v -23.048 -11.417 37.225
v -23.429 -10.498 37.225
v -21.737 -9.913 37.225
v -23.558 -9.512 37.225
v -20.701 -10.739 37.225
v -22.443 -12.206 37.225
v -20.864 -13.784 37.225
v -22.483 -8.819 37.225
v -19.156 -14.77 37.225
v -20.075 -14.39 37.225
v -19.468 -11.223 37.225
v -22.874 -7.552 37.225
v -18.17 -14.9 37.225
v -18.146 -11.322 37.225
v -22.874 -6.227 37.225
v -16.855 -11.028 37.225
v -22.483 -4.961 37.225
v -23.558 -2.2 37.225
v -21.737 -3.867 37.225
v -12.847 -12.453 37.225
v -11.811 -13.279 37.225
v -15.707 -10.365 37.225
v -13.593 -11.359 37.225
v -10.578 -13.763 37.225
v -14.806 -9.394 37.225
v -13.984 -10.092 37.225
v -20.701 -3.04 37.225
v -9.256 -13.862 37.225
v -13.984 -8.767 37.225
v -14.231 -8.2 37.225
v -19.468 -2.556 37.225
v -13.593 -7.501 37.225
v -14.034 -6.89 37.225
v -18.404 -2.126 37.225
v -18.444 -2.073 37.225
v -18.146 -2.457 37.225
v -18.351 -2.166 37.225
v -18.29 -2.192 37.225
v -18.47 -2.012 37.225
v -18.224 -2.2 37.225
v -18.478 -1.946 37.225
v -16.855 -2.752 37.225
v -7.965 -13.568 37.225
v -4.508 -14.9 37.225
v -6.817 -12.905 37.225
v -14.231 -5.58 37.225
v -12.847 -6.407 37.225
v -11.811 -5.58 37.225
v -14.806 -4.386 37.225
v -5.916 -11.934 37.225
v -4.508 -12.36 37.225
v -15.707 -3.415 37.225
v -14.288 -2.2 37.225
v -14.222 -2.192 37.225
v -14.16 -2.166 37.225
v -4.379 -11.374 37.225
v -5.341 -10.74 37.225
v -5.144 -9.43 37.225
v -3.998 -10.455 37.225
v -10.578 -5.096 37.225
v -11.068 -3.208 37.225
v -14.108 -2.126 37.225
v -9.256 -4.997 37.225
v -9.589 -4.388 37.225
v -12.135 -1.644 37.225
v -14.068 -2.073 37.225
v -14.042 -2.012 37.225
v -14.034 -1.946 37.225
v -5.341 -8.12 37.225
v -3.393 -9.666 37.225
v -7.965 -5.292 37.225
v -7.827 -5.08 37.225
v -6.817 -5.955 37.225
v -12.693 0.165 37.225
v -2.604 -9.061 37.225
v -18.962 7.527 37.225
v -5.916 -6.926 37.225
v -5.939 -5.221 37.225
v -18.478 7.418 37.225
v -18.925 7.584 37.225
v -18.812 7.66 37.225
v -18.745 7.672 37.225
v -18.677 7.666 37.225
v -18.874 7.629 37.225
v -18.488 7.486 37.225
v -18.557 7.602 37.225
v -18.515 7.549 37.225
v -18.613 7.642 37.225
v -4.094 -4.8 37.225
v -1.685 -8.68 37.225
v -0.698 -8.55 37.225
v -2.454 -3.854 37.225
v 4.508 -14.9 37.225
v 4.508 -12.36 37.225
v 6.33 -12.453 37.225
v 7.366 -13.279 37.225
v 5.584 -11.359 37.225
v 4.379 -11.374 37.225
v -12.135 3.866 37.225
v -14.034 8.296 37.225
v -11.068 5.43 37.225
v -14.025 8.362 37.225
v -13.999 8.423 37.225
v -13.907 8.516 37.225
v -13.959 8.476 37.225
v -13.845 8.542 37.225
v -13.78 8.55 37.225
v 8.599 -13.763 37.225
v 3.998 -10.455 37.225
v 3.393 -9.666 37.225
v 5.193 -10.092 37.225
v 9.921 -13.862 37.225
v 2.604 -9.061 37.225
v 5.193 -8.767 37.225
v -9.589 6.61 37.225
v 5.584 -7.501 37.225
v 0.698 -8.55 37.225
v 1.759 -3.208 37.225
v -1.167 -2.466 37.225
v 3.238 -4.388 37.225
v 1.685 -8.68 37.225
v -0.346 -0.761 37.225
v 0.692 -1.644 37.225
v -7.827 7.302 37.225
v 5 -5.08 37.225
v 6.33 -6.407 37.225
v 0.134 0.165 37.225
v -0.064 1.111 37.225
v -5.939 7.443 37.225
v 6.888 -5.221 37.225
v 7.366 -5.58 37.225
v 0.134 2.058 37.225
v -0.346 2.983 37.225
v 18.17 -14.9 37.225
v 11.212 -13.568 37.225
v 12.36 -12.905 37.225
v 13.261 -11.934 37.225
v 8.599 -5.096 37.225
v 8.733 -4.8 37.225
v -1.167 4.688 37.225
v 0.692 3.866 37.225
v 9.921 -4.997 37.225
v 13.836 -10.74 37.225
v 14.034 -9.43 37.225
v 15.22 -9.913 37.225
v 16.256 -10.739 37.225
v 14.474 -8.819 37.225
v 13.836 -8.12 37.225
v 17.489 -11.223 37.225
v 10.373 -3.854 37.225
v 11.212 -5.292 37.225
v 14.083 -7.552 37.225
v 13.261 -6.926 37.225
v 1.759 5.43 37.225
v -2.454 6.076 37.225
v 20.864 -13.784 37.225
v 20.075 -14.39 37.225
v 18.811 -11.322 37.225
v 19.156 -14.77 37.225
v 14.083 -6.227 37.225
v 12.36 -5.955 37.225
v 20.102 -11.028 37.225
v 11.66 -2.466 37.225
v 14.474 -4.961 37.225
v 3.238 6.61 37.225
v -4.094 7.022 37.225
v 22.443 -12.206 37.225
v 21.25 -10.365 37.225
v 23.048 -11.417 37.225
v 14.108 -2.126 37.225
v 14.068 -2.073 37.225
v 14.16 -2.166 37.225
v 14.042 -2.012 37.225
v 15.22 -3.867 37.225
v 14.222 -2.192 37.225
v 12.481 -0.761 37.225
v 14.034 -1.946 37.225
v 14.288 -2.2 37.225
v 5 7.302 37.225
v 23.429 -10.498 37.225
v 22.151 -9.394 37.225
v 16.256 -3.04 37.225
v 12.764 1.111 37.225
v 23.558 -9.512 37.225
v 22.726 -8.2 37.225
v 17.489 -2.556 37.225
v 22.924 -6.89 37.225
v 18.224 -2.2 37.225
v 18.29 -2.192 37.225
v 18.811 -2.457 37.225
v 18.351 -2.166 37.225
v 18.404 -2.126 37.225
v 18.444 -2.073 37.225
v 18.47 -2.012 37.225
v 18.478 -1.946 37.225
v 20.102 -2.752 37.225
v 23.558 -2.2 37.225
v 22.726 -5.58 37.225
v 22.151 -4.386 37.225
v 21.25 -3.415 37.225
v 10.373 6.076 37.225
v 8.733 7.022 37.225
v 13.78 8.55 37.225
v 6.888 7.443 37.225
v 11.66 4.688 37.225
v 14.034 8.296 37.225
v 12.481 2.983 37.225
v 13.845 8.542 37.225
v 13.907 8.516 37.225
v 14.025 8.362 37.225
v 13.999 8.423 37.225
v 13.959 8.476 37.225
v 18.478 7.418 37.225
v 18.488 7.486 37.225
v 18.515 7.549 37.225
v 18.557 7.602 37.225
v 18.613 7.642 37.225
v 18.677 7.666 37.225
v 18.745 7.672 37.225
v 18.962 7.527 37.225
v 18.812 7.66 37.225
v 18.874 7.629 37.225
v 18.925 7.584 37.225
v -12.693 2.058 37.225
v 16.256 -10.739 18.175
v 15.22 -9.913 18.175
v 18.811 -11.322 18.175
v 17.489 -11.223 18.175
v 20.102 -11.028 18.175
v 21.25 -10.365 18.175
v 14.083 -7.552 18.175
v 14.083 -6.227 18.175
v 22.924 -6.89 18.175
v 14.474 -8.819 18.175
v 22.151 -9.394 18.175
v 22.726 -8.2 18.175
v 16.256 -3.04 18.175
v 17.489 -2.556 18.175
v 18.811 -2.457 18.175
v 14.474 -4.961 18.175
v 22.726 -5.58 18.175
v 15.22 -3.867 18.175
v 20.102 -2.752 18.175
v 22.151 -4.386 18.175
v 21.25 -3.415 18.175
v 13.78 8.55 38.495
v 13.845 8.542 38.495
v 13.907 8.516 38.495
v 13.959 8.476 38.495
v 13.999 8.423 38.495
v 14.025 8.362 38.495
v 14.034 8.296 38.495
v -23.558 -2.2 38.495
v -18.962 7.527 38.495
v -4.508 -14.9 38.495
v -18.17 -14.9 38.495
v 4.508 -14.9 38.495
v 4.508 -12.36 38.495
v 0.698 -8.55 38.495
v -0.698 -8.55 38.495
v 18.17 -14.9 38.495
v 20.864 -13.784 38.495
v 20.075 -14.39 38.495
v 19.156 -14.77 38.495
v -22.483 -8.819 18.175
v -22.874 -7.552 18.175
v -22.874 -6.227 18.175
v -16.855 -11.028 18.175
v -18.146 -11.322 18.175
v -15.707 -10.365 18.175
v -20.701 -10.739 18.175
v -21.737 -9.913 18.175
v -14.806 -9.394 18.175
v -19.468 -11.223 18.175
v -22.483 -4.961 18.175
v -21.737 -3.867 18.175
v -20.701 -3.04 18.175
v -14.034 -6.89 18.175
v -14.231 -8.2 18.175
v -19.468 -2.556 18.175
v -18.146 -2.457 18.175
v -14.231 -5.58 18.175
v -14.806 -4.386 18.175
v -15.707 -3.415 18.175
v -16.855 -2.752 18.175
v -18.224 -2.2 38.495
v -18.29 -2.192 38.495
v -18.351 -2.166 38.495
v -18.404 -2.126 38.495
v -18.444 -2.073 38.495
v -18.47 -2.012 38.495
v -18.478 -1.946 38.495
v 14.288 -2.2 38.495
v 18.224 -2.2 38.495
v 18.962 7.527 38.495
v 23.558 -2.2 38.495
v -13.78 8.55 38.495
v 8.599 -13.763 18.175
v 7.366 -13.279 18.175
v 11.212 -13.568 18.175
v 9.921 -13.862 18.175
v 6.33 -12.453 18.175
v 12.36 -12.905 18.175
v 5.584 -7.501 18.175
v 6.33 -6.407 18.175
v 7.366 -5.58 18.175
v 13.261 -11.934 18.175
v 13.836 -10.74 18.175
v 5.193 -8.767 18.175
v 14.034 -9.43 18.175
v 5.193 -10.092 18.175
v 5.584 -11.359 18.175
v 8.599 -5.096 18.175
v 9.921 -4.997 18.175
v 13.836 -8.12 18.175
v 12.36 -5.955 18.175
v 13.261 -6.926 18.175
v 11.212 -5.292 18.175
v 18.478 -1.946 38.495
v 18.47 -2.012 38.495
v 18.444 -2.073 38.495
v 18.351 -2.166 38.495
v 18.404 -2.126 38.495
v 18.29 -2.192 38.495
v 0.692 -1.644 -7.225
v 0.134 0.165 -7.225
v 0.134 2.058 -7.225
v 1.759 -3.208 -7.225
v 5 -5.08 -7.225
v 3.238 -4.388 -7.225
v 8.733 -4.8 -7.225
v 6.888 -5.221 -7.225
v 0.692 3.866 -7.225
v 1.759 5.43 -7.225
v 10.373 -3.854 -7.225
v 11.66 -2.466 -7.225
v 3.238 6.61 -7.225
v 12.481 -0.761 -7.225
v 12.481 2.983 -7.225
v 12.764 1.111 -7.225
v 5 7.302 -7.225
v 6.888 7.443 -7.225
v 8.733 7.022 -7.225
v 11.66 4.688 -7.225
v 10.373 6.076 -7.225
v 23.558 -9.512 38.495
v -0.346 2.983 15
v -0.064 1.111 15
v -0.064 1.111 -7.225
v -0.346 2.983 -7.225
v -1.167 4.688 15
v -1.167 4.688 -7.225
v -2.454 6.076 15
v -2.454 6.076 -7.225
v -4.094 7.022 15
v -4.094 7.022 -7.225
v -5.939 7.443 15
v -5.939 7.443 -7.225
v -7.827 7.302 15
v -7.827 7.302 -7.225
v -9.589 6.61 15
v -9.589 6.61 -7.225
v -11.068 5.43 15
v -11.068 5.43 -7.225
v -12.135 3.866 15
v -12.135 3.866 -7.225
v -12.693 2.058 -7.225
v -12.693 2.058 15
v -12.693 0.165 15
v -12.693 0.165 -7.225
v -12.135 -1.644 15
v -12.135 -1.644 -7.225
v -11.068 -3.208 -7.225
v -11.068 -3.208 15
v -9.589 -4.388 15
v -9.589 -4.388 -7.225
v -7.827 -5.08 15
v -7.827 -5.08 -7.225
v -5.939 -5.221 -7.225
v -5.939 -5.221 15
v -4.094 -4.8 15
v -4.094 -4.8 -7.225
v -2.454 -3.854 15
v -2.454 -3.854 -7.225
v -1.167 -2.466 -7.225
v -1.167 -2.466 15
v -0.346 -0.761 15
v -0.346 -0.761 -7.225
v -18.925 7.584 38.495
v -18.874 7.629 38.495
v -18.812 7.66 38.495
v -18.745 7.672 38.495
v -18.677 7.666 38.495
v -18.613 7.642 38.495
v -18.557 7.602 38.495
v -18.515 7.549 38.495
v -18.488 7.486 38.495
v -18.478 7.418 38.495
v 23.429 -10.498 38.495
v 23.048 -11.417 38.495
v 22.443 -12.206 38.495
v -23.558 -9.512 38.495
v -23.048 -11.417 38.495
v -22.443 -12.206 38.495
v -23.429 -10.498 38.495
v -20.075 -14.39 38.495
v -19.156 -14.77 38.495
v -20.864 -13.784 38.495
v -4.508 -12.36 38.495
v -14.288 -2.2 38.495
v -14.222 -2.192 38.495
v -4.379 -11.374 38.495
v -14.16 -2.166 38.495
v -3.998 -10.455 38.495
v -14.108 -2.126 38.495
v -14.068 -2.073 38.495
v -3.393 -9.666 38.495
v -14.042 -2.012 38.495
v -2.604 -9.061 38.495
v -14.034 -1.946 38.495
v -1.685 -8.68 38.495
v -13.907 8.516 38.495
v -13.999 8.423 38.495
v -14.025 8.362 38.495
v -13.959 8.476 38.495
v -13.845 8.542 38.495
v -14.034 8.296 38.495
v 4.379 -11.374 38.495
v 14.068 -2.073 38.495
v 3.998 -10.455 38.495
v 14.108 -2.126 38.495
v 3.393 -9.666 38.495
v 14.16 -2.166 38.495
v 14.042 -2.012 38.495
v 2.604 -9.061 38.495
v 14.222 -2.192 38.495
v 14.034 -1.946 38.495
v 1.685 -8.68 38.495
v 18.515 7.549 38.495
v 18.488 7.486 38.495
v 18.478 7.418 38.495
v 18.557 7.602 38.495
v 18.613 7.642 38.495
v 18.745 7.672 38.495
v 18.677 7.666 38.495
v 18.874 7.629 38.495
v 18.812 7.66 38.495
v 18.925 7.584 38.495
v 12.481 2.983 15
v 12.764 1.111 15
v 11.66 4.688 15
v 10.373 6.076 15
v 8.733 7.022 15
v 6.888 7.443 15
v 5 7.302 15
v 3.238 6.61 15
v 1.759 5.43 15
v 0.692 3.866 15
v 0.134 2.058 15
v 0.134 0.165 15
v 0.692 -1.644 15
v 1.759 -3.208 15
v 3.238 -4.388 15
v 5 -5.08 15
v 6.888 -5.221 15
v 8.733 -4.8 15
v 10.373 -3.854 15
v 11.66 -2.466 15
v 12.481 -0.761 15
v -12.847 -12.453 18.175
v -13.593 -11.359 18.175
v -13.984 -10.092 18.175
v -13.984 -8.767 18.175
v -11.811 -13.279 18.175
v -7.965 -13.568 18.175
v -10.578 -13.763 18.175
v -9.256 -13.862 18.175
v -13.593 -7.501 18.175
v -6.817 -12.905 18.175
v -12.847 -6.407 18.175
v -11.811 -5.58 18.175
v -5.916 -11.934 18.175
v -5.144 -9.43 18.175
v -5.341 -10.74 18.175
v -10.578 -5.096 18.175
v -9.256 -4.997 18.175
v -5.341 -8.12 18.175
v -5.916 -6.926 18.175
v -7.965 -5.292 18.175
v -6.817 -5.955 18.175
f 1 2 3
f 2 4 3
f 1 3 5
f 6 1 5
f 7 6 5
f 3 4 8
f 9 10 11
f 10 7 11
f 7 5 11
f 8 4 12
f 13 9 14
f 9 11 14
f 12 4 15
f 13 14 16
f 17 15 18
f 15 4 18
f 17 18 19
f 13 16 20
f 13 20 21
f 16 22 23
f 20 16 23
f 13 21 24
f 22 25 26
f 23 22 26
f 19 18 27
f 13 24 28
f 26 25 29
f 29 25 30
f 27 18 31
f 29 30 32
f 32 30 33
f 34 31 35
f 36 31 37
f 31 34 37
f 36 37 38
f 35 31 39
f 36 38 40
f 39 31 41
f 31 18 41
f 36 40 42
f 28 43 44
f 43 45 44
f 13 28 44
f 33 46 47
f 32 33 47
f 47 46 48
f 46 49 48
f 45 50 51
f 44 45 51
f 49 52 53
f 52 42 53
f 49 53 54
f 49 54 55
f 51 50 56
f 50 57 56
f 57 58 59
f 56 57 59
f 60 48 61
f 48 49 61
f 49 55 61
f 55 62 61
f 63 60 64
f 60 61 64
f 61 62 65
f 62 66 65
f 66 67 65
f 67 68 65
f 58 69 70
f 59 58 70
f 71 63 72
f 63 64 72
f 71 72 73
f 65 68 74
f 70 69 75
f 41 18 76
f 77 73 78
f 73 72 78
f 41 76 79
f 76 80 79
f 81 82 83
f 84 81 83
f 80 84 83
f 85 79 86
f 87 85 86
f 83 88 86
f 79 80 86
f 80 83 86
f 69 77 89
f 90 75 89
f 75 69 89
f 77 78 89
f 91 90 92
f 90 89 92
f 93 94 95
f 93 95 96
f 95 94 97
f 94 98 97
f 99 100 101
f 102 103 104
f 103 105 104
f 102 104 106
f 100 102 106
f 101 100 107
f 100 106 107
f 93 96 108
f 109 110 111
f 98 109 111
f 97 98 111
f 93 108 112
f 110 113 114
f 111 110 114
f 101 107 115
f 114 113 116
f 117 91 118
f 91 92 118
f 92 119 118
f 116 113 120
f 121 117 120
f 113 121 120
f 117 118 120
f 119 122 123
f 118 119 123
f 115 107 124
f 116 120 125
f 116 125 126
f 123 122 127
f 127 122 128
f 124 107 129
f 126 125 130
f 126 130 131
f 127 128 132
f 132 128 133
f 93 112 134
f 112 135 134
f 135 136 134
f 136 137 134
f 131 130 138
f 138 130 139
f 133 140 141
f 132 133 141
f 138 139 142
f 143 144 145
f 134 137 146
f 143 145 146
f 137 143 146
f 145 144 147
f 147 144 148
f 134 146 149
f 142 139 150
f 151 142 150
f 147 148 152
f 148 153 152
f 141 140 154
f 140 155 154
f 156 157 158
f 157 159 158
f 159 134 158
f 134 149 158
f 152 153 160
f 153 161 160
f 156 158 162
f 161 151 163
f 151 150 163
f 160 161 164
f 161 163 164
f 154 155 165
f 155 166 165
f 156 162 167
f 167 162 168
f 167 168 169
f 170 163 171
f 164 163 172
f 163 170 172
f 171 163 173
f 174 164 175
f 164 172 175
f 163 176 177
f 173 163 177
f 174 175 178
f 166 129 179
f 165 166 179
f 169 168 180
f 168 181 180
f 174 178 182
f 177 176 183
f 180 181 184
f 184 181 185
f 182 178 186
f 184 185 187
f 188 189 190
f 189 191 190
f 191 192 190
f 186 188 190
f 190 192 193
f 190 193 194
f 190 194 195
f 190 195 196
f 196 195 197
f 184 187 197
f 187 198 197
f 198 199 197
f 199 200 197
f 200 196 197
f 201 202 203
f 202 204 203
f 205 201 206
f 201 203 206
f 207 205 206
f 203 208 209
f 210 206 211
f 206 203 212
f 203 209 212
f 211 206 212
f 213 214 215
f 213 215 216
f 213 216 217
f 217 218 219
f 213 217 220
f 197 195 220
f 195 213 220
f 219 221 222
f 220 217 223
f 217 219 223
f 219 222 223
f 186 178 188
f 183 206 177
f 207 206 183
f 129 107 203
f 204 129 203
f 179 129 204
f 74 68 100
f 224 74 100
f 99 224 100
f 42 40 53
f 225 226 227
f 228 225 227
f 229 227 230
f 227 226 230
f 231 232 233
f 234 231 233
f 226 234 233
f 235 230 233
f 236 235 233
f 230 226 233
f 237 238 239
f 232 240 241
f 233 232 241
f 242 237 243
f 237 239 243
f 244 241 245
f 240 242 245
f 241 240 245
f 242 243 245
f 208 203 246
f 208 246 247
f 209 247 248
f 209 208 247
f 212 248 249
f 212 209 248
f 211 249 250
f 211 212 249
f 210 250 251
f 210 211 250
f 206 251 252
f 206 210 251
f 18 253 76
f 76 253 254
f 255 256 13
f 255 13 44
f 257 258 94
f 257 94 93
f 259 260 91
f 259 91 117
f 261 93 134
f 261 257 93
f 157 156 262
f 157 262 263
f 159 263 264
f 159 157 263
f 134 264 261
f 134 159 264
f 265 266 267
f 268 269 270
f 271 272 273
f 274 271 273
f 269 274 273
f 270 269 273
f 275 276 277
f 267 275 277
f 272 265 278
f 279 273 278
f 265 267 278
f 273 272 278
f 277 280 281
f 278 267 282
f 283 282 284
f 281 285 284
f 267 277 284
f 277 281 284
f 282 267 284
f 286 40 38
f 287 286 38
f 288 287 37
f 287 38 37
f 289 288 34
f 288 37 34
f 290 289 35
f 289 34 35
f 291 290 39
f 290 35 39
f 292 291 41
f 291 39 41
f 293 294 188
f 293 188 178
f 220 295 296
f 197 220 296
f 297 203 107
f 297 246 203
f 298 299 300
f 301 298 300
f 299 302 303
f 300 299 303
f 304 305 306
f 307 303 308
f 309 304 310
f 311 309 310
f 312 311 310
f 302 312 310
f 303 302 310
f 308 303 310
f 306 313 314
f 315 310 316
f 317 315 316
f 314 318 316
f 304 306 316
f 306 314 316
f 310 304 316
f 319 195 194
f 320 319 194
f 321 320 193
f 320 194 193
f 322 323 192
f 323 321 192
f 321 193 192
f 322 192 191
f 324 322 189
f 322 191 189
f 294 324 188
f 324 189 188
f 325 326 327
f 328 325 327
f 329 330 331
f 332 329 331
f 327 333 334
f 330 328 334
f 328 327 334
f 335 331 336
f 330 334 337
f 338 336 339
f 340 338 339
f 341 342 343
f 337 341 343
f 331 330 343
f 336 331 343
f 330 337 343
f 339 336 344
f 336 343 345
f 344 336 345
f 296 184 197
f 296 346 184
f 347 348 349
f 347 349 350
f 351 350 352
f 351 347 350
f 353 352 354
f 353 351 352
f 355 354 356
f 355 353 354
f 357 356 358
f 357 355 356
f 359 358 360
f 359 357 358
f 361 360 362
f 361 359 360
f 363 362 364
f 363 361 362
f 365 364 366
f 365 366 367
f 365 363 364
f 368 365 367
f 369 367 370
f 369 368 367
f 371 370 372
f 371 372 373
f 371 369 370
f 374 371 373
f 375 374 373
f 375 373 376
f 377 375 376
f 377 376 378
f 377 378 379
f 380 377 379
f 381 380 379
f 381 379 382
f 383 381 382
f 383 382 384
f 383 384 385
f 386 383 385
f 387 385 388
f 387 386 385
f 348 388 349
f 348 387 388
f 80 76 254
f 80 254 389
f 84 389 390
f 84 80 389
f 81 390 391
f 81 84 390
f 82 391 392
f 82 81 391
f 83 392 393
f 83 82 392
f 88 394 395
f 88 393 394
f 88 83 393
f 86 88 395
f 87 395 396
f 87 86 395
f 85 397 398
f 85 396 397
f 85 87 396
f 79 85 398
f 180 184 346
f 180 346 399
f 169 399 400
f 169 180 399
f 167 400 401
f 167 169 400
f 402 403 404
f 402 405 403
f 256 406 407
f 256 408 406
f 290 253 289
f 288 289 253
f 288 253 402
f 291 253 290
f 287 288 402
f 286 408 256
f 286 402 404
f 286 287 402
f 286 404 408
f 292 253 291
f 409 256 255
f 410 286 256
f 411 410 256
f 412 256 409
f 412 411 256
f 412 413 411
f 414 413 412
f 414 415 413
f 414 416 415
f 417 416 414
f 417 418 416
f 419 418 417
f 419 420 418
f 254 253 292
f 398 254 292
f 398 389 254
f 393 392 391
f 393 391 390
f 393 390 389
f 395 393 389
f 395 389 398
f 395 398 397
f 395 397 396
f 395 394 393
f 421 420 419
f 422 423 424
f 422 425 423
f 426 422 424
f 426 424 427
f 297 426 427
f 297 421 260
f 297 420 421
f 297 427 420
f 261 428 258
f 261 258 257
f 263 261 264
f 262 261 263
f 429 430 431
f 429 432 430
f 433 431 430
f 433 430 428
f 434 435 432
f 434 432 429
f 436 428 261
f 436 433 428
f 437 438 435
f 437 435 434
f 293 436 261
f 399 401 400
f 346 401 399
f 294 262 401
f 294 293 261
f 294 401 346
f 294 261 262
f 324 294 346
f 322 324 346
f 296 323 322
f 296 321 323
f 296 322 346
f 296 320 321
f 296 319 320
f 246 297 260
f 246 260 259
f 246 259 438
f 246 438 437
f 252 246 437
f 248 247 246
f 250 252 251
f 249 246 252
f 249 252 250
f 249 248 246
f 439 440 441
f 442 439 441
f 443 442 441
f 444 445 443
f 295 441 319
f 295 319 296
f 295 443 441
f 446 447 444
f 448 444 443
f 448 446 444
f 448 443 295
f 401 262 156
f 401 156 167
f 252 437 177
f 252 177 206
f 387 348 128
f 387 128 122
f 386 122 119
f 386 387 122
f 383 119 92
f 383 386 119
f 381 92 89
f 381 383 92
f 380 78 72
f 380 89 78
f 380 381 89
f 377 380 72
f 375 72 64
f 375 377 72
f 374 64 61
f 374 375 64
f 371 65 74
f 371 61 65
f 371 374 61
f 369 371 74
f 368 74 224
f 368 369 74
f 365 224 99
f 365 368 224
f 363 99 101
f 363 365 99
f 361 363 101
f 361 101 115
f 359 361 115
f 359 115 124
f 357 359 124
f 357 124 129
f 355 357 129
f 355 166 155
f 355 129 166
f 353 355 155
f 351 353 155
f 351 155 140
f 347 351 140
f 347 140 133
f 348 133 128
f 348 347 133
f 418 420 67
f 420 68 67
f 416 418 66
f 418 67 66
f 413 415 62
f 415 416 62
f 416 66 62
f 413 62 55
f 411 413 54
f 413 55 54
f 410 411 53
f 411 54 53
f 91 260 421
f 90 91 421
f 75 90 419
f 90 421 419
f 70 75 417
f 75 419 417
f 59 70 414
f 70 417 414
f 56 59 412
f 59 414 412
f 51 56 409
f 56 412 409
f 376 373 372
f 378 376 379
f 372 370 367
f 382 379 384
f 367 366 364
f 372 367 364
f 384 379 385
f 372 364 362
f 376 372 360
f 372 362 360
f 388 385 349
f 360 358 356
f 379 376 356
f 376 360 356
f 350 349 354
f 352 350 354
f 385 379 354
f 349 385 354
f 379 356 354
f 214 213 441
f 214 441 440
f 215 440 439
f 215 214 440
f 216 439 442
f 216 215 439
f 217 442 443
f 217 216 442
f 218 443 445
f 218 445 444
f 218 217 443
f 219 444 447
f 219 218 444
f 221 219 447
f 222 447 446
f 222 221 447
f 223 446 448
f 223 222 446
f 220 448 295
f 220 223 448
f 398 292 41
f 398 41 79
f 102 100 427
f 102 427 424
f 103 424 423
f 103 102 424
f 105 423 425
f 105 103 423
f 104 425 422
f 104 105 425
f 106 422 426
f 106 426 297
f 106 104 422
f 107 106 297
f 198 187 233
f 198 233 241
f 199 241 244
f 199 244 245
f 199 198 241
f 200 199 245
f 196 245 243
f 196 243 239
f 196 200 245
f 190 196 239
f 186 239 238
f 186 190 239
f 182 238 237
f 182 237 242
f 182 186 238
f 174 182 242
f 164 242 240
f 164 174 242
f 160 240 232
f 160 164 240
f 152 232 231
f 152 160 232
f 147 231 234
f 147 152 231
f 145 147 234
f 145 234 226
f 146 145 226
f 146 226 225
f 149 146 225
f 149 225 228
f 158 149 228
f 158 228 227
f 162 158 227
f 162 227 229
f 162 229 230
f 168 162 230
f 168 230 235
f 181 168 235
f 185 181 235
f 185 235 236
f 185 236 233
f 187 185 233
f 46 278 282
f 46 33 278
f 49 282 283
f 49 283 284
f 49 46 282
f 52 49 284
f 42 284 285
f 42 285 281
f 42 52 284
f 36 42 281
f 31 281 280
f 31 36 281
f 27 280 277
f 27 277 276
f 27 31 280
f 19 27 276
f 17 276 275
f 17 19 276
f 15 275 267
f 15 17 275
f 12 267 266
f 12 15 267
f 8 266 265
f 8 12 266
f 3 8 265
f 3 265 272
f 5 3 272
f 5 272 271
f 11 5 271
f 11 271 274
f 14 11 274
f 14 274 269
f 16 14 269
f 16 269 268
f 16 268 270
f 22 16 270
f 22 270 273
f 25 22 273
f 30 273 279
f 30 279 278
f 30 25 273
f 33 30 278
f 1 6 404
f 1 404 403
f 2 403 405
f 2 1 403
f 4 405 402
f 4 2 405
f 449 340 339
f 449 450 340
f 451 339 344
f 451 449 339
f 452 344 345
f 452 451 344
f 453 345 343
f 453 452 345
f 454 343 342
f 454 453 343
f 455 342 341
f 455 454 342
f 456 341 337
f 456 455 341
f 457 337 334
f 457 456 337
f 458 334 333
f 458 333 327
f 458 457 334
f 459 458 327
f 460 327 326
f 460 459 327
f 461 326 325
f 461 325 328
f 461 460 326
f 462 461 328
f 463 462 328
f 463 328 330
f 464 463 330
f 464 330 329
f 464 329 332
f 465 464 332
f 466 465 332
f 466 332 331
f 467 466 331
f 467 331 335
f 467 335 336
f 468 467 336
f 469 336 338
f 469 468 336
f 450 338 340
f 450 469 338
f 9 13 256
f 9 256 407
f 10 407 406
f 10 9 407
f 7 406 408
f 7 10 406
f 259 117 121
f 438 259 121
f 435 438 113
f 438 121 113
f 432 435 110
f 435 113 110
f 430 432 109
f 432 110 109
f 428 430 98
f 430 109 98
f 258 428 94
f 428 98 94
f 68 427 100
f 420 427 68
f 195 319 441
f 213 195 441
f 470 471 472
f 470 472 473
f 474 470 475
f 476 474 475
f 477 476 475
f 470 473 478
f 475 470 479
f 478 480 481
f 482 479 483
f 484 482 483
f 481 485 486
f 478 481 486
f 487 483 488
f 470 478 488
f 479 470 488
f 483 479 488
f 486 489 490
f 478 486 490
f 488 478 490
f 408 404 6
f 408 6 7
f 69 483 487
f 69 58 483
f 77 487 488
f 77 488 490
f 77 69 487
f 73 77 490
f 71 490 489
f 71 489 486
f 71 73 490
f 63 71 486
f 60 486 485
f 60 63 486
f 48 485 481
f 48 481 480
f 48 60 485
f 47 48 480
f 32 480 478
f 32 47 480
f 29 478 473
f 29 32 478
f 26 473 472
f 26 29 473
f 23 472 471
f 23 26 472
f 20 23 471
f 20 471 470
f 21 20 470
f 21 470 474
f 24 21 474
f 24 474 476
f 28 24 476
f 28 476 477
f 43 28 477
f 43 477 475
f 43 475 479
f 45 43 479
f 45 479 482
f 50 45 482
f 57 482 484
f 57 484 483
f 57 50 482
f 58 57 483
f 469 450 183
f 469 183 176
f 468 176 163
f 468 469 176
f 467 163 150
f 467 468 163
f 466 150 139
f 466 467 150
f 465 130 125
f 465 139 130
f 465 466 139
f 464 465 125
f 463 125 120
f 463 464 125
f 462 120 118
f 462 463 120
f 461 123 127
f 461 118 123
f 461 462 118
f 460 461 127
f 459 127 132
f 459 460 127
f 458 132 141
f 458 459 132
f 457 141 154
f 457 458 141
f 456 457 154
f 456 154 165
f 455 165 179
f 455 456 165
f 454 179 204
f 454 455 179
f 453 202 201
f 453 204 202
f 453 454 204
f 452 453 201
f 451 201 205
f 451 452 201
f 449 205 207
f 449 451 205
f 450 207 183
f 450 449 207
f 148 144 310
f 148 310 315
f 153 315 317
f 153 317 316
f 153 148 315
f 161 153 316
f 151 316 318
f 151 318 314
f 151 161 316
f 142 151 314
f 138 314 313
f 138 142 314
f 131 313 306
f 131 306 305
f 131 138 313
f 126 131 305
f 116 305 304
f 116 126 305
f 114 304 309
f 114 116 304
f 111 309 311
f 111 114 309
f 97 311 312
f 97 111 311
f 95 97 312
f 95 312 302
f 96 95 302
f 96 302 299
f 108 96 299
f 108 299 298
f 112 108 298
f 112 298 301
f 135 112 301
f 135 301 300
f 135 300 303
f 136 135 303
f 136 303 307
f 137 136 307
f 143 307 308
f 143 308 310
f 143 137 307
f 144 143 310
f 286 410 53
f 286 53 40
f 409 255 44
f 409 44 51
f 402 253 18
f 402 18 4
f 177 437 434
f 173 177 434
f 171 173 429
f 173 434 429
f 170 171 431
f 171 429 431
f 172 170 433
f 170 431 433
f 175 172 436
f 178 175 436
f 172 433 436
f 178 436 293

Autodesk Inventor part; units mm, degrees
ref_plane "YZ Plane" through (0, 0, 0) normal (1, 0, 0) x (0, 1, 0)
ref_plane "XZ Plane" through (0, 0, 0) normal (0, 1, 0) x (-1, 0, 0)
ref_plane "XY Plane" through (0, 0, 0) normal (0, 0, 1) x (1, 0, 0)
sketch "Sketch1" plane through (-4.5, -9.15, 9.417) normal (0, -1, 0) x (1, 0, 0)
  point P0 (4.5, -9.417)
sketch "Sketch2" plane through (1.8079, 5.5858, 15) normal (0, 0, 1) x (1, 0, 0)
  line L0 (-1.8079, -5.5858) -> (-1.8079, -0.7733)
  circle A0 centre (-8.2214, -4.4747) radius 6.35
  circle A1 centre (4.6056, -4.4747) radius 6.35
  dimension "d0" = 12.7
  dimension "d1" = 6.4135
  dimension "d2" = 12.7
  dimension "d3" = 6.4135
extrude "Extrusion1" add sketch "Sketch2" along normal mid plane 44.45
sketch "Sketch4" plane through (6.4135, 1.1111, 37.225) normal (0, 0, 1) x (1, 0, 0)
  circle A0 centre (3.175, -10.541) radius 4.445
  circle A1 centre (0, 0) radius 6.35 projected
  point P0 (-6.4135, -1.1111)
  dimension "d7" = 8.89
  dimension "d8" = 10.541
  dimension "d9" = 3.175
sketch "Sketch5" plane through (-6.4135, 1.1111, 37.225) normal (0, 0, 1) x (1, 0, 0)
  circle A0 centre (-3.175, -10.541) radius 4.445
  circle A1 centre (0, 0) radius 6.35 projected
  point P0 (6.4135, -1.1111)
  dimension "d10" = 8.89
  dimension "d11" = 3.175
  dimension "d12" = 10.541
extrude "Extrusion2" add sketch "Sketch4" against normal blind 19.05 contours A0
extrude "Extrusion3" add sketch "Sketch5" against normal blind 19.05 contours A0
sketch "Sketch6" plane through (-9.5885, -9.4299, 37.225) normal (0, 0, 1) x (1, 0, 0)
  circle A0 centre (-8.89, 2.54) radius 4.445
  circle A1 centre (0, 0) radius 4.445 projected
  line L0 (0, 0) -> (0, 2.54)
  point P0 (9.5885, 9.4299)
  dimension "d17" = 8.89
  dimension "d18" = 8.89
  dimension "d52" = 2.54
  dimension "d53" = 0
extrude "Extrusion4" add sketch "Sketch6" against normal blind 19.05 contours A0
sketch "Sketch7" plane through (9.5885, -9.4299, 37.225) normal (0, 0, 1) x (1, 0, 0)
  circle A0 centre (8.89, 2.54) radius 4.445
  circle A1 centre (0, 0) radius 4.445 projected
  line L0 (0, 0) -> (0, 2.54)
  point P0 (-9.5885, 9.4299)
  dimension "d22" = 8.89
  dimension "d54" = 2.54
  dimension "d55" = 0
extrude "Extrusion5" add sketch "Sketch7" against normal blind 19.05 contours A0
sketch "Sketch8" plane through (6.4135, 1.1111, 37.225) normal (0, 0, 1) x (1, 0, 0)
  line L0 (-7.62, -6.7786) -> (7.62, -6.7786)
  line L1 (7.62, -6.7786) -> (7.62, 7.1914)
  line L2 (7.62, 7.1914) -> (-7.62, 7.1914)
  line L3 (-7.62, 7.1914) -> (-7.62, -6.7786)
  line L4 (-7.62, -6.7786) -> (7.62, 7.1914) construction
  line L5 (7.62, -6.7786) -> (-7.62, 7.1914) construction
  point P0 (-6.4135, -1.1111)
  point P1 (0, 0.2064)
  dimension "d27" = 15.24
  dimension "d28" = 13.97
sketch "Sketch9" plane through (-6.4135, 1.1111, 37.225) normal (0, 0, 1) x (1, 0, 0)
  line L0 (-7.62, -6.7768) -> (7.62, -6.7768)
  line L1 (7.62, -6.7768) -> (7.62, 7.1932)
  line L2 (7.62, 7.1932) -> (-7.62, 7.1932)
  line L3 (-7.62, 7.1932) -> (-7.62, -6.7768)
  line L4 (-7.62, -6.7768) -> (7.62, 7.1932) construction
  line L5 (7.62, -6.7768) -> (-7.62, 7.1932) construction
  point P0 (6.4135, -1.1111)
  point P1 (0, 0.2082)
  dimension "d29" = 15.24
  dimension "d30" = 13.97
extrude "Extrusion6" add sketch "Sketch9" along normal blind 1.27
extrude "Extrusion7" add sketch "Sketch8" along normal blind 1.27
sketch "Sketch10" plane through (-6.4135, 1.1111, 38.495) normal (0, 0, 1) x (1, 0, 0)
  line L0 (-7.62, -9.6614) -> (20.447, -9.6614)
  line L1 (20.447, -9.6614) -> (20.447, 7.4393)
  line L2 (20.447, 7.4393) -> (-7.62, 7.4393)
  line L3 (-7.62, 7.4393) -> (-7.62, -9.6614)
  line L4 (-7.62, -9.6614) -> (20.447, 7.4393) construction
  line L5 (20.447, -9.6614) -> (-7.62, 7.4393) construction
  point P0 (6.4135, -1.1111)
extrude "Extrusion8" add sketch "Sketch10" against normal blind 1.27
sketch "Sketch11" plane through (-6.4135, 1.1111, 38.495) normal (0, 0, 1) x (1, 0, 0)
  line L0 (-17.145, -16.0114) -> (1.905, -16.0114)
  line L1 (1.905, -16.0114) -> (1.905, -3.3114)
  line L2 (1.905, -3.3114) -> (-17.145, -3.3114)
  line L3 (-17.145, -3.3114) -> (-17.145, -16.0114)
  line L4 (-7.62, -9.6614) -> (-7.62, 7.4393) projected
  line L5 (-17.145, -16.0114) -> (1.905, -3.3114) construction
  line L6 (1.905, -16.0114) -> (-17.145, -3.3114) construction
  line L7 (10.922, -16.0114) -> (29.972, -16.0114)
  line L8 (29.972, -16.0114) -> (29.972, -3.3114)
  line L9 (29.972, -3.3114) -> (10.922, -3.3114)
  line L10 (10.922, -3.3114) -> (10.922, -16.0114)
  line L11 (20.447, -9.6614) -> (20.447, 7.4393) projected
  line L12 (10.922, -16.0114) -> (29.972, -3.3114) construction
  line L13 (29.972, -16.0114) -> (10.922, -3.3114) construction
  line L14 (-12.065, -3.3114) -> (-12.065, 7.4393)
  line L15 (24.892, -3.3114) -> (24.892, 7.4393)
  line L16 (24.892, 7.4393) -> (29.972, -3.3114)
  line L17 (-17.145, -3.3114) -> (-12.065, 7.4393)
  point P0 (6.4135, -1.1111)
  dimension "d37" = 19.05
  dimension "d38" = 12.7
  dimension "d39" = 19.05
  dimension "d40" = 12.7
  dimension "d41" = 5.08
  dimension "d42" = 5.08
extrude "Extrusion9" add sketch "Sketch11" against normal blind 1.27
fillet "Fillet1" radius 0.254 2 edges at (-18.4785, 8.5503, 37.86) (18.4785, 8.5503, 37.86)
fillet "Fillet2" radius 0.254 6 edges at (-14.0335, 8.5503, 37.86) (-18.4785, -2.2003, 37.86) (-14.0335, -2.2003, 37.86) (14.0335, -2.2003, 37.86) (18.4785, -2.2003, 37.86) (14.0335, 8.5503, 37.86)
fillet "Fillet3" radius 3.81 4 edges at (-23.5585, -14.9003, 37.86) (23.5585, -14.9003, 37.86) (-4.5085, -8.5503, 37.86) (4.5085, -8.5503, 37.86)
sketch "Sketch13" plane through (-6.4135, 1.1111, 38.495) normal (0, 0, 1) x (1, 0, 0)
  point P0 (6.4135, -1.1111)
sketch "Sketch14" plane through (-6.4135, 1.1111, 38.495) normal (0, 0, 1) x (1, 0, 0)
  arc A0 (-17.145, -12.2014) -> (-13.335, -16.0114) centre (-13.335, -12.2014) ccw projected
  line L0 (-17.145, -12.2014) -> (-13.335, -16.0114)
  line L1 (-13.335, -16.0114) -> (-15.2586, -17.935)
  line L2 (-15.2586, -17.935) -> (-19.0686, -14.125)
  line L3 (-19.0686, -14.125) -> (-17.145, -12.2014)
  arc A1 (26.162, -16.0114) -> (29.972, -12.2014) centre (26.162, -12.2014) ccw projected
  line L4 (26.162, -16.0114) -> (29.972, -12.2014)
  line L5 (29.972, -12.2014) -> (31.5861, -13.8155)
  line L6 (31.5861, -13.8155) -> (27.7761, -17.6255)
  line L7 (27.7761, -17.6255) -> (26.162, -16.0114)
  point P0 (6.4135, -1.1111)
extrude "Extrusion10" cut sketch "Sketch14" against normal blind 1.27 contours L0 A0 | L4 A1
fillet "Fillet4" radius 3.81 4 edges at (-23.5585, -11.0903, 37.86) (-19.7485, -14.9003, 37.86) (23.5585, -11.0903, 37.86) (19.7485, -14.9003, 37.86)
properties part number "Mamba XLX ESC"
